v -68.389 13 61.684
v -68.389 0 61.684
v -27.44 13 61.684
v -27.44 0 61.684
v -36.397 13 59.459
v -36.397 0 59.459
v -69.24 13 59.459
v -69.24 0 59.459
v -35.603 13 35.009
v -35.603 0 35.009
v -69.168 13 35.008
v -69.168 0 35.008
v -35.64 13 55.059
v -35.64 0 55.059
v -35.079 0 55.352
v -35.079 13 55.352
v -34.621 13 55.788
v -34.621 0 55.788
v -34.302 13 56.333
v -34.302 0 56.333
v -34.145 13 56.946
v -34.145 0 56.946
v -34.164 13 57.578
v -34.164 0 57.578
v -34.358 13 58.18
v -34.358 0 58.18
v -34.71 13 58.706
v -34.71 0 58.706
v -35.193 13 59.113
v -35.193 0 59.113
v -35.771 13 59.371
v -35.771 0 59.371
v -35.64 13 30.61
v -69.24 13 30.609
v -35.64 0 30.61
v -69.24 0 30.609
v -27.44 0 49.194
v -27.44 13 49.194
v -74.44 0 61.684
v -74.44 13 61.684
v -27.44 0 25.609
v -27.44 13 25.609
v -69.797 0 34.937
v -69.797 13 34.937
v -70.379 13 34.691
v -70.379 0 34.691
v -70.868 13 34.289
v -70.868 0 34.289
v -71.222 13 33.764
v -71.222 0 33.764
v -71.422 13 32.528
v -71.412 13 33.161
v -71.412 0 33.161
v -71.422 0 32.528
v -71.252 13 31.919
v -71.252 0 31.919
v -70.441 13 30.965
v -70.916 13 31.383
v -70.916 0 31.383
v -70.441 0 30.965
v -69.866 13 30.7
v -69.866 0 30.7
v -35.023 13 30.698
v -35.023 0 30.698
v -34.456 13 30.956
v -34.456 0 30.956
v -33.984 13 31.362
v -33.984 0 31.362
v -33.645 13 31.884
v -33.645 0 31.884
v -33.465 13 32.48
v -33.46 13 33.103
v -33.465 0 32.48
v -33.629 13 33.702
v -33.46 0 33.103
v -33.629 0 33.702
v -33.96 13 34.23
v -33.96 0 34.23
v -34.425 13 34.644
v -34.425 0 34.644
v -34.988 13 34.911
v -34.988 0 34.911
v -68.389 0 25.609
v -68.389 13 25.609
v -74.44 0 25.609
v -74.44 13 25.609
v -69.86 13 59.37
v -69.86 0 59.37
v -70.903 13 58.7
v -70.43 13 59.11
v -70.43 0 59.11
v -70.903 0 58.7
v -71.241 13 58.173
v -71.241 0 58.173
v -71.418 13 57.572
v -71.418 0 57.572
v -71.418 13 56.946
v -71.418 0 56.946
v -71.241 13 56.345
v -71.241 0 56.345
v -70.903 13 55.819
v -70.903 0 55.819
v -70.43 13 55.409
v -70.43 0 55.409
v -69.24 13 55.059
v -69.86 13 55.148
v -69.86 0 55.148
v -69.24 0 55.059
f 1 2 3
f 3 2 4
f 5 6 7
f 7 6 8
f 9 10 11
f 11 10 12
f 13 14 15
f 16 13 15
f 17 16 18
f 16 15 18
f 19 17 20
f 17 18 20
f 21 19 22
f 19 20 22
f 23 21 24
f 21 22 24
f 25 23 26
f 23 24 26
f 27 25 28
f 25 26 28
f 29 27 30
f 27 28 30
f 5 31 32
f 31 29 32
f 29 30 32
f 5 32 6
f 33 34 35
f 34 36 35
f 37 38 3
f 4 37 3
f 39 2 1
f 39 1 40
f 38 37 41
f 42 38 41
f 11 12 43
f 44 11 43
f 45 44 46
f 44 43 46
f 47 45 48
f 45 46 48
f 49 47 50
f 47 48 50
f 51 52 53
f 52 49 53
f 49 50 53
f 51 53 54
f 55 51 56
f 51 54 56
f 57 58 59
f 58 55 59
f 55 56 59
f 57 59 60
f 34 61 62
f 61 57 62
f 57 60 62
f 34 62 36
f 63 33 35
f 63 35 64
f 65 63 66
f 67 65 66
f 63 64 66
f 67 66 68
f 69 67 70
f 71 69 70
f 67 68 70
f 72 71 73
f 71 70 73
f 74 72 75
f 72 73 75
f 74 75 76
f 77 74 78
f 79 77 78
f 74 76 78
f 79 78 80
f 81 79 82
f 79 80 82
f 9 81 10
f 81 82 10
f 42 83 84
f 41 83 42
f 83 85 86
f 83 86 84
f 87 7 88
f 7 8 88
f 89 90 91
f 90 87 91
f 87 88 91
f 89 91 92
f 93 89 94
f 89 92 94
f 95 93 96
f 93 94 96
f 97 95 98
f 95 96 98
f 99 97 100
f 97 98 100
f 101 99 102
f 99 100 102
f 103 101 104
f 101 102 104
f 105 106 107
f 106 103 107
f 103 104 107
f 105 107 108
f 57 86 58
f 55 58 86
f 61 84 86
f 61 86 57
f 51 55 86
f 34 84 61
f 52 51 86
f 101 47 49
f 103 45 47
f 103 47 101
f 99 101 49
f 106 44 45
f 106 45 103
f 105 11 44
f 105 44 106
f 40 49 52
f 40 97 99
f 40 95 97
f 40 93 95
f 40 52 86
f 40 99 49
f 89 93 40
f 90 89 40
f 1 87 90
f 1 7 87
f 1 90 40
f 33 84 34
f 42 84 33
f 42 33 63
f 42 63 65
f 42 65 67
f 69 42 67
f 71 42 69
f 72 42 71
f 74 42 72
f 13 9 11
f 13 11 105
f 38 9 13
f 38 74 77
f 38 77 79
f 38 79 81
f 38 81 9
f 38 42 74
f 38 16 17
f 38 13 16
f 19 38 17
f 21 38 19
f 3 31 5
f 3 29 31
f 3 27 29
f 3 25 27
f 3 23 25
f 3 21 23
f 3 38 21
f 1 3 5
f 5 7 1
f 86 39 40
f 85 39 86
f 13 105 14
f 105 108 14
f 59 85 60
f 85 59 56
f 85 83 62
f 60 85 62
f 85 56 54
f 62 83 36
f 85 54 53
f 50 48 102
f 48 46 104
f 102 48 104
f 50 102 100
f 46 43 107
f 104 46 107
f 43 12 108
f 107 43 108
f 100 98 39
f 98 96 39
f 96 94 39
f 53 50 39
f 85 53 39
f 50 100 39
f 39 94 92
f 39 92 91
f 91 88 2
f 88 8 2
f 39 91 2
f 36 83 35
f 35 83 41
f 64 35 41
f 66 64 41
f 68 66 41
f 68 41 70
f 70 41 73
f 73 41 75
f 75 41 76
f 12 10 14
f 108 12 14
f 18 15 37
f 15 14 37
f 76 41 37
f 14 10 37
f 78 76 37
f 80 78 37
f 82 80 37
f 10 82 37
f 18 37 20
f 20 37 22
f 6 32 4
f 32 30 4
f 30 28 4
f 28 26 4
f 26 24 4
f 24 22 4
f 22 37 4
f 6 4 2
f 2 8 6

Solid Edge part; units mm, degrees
sketch "Sketch1" plane through (0, 0, 0) normal (0, -1, 0) x (1, 0, 0)
  line L0 (-69.2402, 30.6087) -> (-35.6398, 30.6102)
  arc A0 (-35.6398, 30.6102) -> (-35.6027, 35.0092) centre (-35.6399, 32.8098) ccw
  line L1 (-35.6027, 35.0092) -> (-69.1679, 35.0077)
  arc A1 (-69.2402, 30.6087) -> (-69.1679, 35.0077) centre (-69.2403, 32.8088) cw
  line L2 (-69.2403, 55.0593) -> (-35.6399, 55.0593)
  arc A2 (-36.3967, 59.4593) -> (-35.6399, 55.0593) centre (-36.3967, 57.1942) cw
  line L3 (-36.3967, 59.4593) -> (-69.2403, 59.4593)
  arc A3 (-69.2403, 55.0593) -> (-69.2403, 59.4593) centre (-69.2403, 57.2593) cw
  line L4 (-27.4403, 49.1944) -> (-27.4403, 25.609)
  line L5 (-68.3891, 25.609) -> (-27.4403, 25.609)
  line L6 (-74.4403, 25.609) -> (-68.3891, 25.609)
  line L7 (-74.4403, 61.6844) -> (-74.4403, 25.609)
  line L8 (-68.3891, 61.6844) -> (-74.4403, 61.6844)
  line L9 (-68.3891, 61.6844) -> (-27.4403, 61.6844)
  line L10 (-27.4403, 49.1944) -> (-27.4403, 61.6844)
  dimension "D1" = 47
  dimension "D2" = 2.2001
  dimension "D3" = 2.1997
  dimension "D4" = 6
  dimension "D5" = 3
extrude "Protrusion1" add sketch "Sketch1" against normal blind 13
